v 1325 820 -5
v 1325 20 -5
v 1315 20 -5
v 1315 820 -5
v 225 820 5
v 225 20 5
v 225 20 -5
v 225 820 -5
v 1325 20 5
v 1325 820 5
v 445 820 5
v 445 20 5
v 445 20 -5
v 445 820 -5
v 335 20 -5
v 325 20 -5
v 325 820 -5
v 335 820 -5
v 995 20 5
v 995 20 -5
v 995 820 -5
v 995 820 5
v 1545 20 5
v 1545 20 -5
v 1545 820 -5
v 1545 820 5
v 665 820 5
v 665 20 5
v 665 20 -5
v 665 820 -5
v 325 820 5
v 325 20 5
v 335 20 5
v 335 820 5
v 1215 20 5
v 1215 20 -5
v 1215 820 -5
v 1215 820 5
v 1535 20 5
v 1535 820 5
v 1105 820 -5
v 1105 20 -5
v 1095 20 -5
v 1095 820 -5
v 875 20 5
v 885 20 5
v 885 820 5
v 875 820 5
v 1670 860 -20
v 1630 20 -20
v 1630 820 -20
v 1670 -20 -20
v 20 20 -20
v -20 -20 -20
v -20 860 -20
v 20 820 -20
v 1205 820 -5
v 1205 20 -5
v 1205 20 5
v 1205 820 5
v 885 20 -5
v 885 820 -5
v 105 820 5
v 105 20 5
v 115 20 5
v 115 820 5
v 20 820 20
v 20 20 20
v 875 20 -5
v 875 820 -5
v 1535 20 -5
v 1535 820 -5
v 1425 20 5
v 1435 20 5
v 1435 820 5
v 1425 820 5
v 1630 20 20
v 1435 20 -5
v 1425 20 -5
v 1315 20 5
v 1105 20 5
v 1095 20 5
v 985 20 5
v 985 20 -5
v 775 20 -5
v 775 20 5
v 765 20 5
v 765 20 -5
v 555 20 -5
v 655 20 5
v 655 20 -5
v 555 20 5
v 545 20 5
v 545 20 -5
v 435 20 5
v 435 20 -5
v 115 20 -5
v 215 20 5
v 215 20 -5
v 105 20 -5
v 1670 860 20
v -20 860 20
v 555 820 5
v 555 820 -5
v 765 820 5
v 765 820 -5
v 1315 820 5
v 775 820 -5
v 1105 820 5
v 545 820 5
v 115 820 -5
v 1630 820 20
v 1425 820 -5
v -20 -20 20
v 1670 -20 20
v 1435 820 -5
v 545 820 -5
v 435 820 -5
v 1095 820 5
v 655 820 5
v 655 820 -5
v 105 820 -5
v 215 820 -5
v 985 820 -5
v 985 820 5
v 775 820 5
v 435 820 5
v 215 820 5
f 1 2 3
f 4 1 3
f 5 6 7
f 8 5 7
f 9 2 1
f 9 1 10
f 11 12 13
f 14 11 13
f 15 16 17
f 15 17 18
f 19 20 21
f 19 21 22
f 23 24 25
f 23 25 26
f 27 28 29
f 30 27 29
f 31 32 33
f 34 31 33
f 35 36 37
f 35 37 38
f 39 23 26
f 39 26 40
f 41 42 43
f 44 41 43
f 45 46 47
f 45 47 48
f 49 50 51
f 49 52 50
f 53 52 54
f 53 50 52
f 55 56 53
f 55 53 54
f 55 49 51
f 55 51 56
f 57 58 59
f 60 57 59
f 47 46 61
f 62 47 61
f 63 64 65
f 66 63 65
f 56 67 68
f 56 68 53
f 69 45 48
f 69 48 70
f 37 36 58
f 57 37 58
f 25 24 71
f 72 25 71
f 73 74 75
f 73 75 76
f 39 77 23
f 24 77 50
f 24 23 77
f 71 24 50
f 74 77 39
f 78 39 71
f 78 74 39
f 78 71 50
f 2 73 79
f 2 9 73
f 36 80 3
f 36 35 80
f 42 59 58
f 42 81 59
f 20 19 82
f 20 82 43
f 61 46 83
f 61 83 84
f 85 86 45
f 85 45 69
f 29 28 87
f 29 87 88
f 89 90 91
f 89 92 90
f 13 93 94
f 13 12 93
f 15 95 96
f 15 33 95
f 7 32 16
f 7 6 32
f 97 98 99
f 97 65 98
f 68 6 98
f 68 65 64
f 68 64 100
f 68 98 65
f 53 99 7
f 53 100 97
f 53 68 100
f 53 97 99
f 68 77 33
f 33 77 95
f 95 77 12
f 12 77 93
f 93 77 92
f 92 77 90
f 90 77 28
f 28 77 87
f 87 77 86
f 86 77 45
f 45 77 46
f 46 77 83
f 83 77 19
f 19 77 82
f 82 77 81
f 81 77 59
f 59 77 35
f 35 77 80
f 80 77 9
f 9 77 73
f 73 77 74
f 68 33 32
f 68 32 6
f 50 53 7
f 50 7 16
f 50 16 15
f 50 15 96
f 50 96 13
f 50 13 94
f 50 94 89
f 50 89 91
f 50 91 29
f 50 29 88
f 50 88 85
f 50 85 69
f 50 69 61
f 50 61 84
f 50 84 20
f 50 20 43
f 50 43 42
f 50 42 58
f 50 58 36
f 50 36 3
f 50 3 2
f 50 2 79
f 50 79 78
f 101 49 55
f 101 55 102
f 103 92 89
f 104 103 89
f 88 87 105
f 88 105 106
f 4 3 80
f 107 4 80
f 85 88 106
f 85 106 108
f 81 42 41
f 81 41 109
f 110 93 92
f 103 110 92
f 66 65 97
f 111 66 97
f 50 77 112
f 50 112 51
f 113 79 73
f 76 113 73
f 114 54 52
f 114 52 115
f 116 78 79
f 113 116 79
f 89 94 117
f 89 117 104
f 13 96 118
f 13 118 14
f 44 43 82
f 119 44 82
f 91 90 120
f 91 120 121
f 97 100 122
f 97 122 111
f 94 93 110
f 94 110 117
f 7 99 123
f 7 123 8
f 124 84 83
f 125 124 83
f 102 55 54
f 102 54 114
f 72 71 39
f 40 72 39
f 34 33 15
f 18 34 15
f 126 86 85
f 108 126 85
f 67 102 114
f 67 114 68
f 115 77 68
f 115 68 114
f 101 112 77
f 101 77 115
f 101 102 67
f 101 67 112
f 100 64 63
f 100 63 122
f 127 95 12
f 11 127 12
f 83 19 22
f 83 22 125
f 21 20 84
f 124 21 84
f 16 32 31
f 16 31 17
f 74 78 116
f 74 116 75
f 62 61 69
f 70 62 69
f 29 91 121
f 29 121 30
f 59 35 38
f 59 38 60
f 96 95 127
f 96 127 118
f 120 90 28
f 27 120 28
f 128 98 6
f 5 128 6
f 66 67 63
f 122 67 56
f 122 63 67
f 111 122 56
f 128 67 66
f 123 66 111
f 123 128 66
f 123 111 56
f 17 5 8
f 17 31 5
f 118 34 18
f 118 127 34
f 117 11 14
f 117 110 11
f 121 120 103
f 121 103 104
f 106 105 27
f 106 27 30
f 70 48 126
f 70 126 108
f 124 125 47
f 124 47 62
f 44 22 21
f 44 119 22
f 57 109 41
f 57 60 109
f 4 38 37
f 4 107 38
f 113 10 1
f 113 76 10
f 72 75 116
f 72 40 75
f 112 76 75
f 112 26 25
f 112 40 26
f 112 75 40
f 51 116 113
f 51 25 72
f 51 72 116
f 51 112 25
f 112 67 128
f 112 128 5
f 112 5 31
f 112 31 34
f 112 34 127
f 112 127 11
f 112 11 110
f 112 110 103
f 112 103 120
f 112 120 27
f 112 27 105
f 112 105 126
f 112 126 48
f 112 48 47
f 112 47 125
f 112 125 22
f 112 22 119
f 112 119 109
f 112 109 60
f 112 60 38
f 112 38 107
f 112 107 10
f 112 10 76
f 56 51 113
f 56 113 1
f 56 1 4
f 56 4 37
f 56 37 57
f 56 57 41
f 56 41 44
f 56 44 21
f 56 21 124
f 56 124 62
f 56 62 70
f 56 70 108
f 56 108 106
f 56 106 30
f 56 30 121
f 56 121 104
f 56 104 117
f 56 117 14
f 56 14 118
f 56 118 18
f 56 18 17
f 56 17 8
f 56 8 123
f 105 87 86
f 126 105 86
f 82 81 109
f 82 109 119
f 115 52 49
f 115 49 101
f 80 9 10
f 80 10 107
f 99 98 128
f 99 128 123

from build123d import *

# Parameters (mm, degrees)
SKETCH_1_W               = 40
SKETCH_1_H               = 40
SKETCH_2_W               = 10
SKETCH_2_H               = 10
EXTRUDE_1_DEPTH          = 800
PATTERN_LINEAR_1_COUNT   = 7
PATTERN_LINEAR_1_PITCH   = 110
MIRROR_1_COPY_1_SKETCH_W = 10
MIRROR_1_COPY_1_SKETCH_H = 10
MIRROR_1_COPY_1_DEPTH    = 800
MIRROR_1_COPY_2_SKETCH_W = 10
MIRROR_1_COPY_2_SKETCH_H = 10
MIRROR_1_COPY_2_DEPTH    = 800
MIRROR_1_COPY_3_SKETCH_W = 10
MIRROR_1_COPY_3_SKETCH_H = 10
MIRROR_1_COPY_3_DEPTH    = 800
MIRROR_1_COPY_4_SKETCH_W = 10
MIRROR_1_COPY_4_SKETCH_H = 10
MIRROR_1_COPY_4_DEPTH    = 800
MIRROR_1_COPY_5_SKETCH_W = 10
MIRROR_1_COPY_5_SKETCH_H = 10
MIRROR_1_COPY_5_DEPTH    = 800
MIRROR_1_COPY_6_SKETCH_W = 10
MIRROR_1_COPY_6_SKETCH_H = 10
MIRROR_1_COPY_6_DEPTH    = 800


with BuildPart() as part:
    # По траектории1: sweep along a curve in space
    with BuildLine() as sweep_1_path:
        Line((0, 0, 0), (0, 840, 0))
        Line((0, 840, 0), (1650, 840, 0))
        Line((1650, 0, 0), (1650, 840, 0))
        Line((0, 0, 0), (1650, 0, 0))
    # Эскиз1 → По траектории1 (sweep)
    with BuildSketch(Plane(origin=(0, 0, 0), x_dir=(1, 0, 0), z_dir=(0, 1, 0))):
        Rectangle(SKETCH_1_W, SKETCH_1_H)
    sweep(path=sweep_1_path.line, transition=Transition.RIGHT)

    # Эскиз2 → Бобышка-Вытянуть1 (add)
    with BuildSketch(Plane(origin=(0, 20, 0), x_dir=(1, 0, 0), z_dir=(0, 1, 0))):
        with Locations((770, 0)):
            Rectangle(SKETCH_2_W, SKETCH_2_H)
    extrude_1 = extrude(amount=EXTRUDE_1_DEPTH)

    # Линейный массив1: Бобышка-Вытянуть1 ×7
    with Locations(*[(-i * PATTERN_LINEAR_1_PITCH, 0, 0) for i in range(1, PATTERN_LINEAR_1_COUNT)]):
        add(extrude_1)

    # Зеркальное отражение1: Бобышка-Вытянуть1 across plane
    add(extrude_1.mirror(Plane.ZY.offset(-825)))

    # Зеркальное отражение1 copy 1 sketch → Зеркальное отражение1 copy 1 (add)
    with BuildSketch(Plane(origin=(1760, 20, 0), x_dir=(-1, 0, 0), z_dir=(0, 1, 0))):
        with Locations((770, 0)):
            Rectangle(MIRROR_1_COPY_1_SKETCH_W, MIRROR_1_COPY_1_SKETCH_H)
    extrude(amount=MIRROR_1_COPY_1_DEPTH)

    # Зеркальное отражение1 copy 2 sketch → Зеркальное отражение1 copy 2 (add)
    with BuildSketch(Plane(origin=(1870, 20, 0), x_dir=(-1, 0, 0), z_dir=(0, 1, 0))):
        with Locations((770, 0)):
            Rectangle(MIRROR_1_COPY_2_SKETCH_W, MIRROR_1_COPY_2_SKETCH_H)
    extrude(amount=MIRROR_1_COPY_2_DEPTH)

    # Зеркальное отражение1 copy 3 sketch → Зеркальное отражение1 copy 3 (add)
    with BuildSketch(Plane(origin=(1980, 20, 0), x_dir=(-1, 0, 0), z_dir=(0, 1, 0))):
        with Locations((770, 0)):
            Rectangle(MIRROR_1_COPY_3_SKETCH_W, MIRROR_1_COPY_3_SKETCH_H)
    extrude(amount=MIRROR_1_COPY_3_DEPTH)

    # Зеркальное отражение1 copy 4 sketch → Зеркальное отражение1 copy 4 (add)
    with BuildSketch(Plane(origin=(2090, 20, 0), x_dir=(-1, 0, 0), z_dir=(0, 1, 0))):
        with Locations((770, 0)):
            Rectangle(MIRROR_1_COPY_4_SKETCH_W, MIRROR_1_COPY_4_SKETCH_H)
    extrude(amount=MIRROR_1_COPY_4_DEPTH)

    # Зеркальное отражение1 copy 5 sketch → Зеркальное отражение1 copy 5 (add)
    with BuildSketch(Plane(origin=(2200, 20, 0), x_dir=(-1, 0, 0), z_dir=(0, 1, 0))):
        with Locations((770, 0)):
            Rectangle(MIRROR_1_COPY_5_SKETCH_W, MIRROR_1_COPY_5_SKETCH_H)
    extrude(amount=MIRROR_1_COPY_5_DEPTH)

    # Зеркальное отражение1 copy 6 sketch → Зеркальное отражение1 copy 6 (add)
    with BuildSketch(Plane(origin=(2310, 20, 0), x_dir=(-1, 0, 0), z_dir=(0, 1, 0))):
        with Locations((770, 0)):
            Rectangle(MIRROR_1_COPY_6_SKETCH_W, MIRROR_1_COPY_6_SKETCH_H)
    extrude(amount=MIRROR_1_COPY_6_DEPTH)


solid = part.part
